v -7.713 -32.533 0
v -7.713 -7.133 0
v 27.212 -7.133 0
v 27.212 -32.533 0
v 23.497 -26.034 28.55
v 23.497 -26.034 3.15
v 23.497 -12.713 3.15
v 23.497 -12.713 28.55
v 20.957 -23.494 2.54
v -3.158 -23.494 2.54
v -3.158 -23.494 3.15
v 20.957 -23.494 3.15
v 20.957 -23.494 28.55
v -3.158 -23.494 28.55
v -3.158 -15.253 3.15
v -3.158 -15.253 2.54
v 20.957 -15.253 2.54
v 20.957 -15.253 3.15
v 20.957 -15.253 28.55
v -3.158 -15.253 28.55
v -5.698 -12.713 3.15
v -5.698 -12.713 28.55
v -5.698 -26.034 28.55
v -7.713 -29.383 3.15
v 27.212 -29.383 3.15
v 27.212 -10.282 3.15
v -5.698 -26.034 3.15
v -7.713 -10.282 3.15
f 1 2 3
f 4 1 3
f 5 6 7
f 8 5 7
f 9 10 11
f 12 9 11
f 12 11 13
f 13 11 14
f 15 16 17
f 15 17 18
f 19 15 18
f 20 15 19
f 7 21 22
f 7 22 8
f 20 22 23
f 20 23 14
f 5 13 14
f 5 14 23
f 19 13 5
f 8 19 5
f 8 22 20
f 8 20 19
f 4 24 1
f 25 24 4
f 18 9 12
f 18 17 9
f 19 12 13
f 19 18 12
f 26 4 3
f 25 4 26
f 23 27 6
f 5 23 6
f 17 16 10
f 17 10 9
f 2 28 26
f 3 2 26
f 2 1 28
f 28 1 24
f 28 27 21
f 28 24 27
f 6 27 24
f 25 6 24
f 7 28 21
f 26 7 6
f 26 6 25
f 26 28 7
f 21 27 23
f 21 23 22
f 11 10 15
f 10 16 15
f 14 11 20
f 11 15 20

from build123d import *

# Parameters (mm, degrees)
F0_W        = 34.925
F0_H        = 25.4
F1_DEPTH    = 3.1496
F2_SIZE     = 3.14959
F3_W        = 29.1948509403
F3_H        = 13.3209023625
F4_DEPTH    = 25.4
F5_T        = 2.54
F5_T3_DEPTH = 34.2748509403
F5_T5_DEPTH = 18.4009023625


# Not quite as in the source:
# - a fillet or chamfer is up to 0.001 mm smaller than in the source, because OpenCascade refuses the exact size
# - a shell that OpenCascade refuses in one call is made with other operations: the cavity is built on its own and cut out


with BuildPart() as f1:
    # F0 (on Top) → F1 (new body)
    with BuildSketch(Plane.XY):
        with Locations((9.7498925388, -19.8326882303)):
            Rectangle(F0_W, F0_H)
    extrude(amount=F1_DEPTH)

    # F2 (size 3.1496 in the source; OpenCascade refuses exactly that, so slightly less here)
    f2_edges = [f1.edges().sort_by_distance(p)[0] for p in [
        (9.749893, -32.532688, 3.1496),
        (9.749893, -7.132688, 3.1496),
    ]]
    chamfer(f2_edges, length=F2_SIZE)

    # F3 (on face) → F4 (join)
    with BuildSketch(Plane.XY.offset(3.1496)):
        with Locations((8.8992563542, -19.3738183007)):
            Rectangle(F3_W, F3_H)
    extrude(amount=F4_DEPTH)

    # F5: shell of thickness 2.54, made by hand


with BuildPart() as f5_core1:
    # F5_t2: copy of F1
    add(f1.part)

    # the walls: a layer under each face that stays
    f5_faces = [f5_core1.faces().sort_by_distance(p)[0] for p in [
        (27.2123925388, -19.8326882303, 1.5748),
        (9.7498925388, -32.5326882303, 5e-06),
        (9.7498925388, -30.9578932303, 1.574805),
        (9.7498925388, -19.8326882303, 0),
        (-1.8917741279, -26.1996282303, 3.1496),
        (9.7498925388, -7.1326882303, 5e-06),
        (9.7498925388, -8.7074832303, 1.574805),
        (-7.7126074612, -19.8326882303, 1.5748),
        (8.8992563542, -12.7133671194, 15.8496),
        (-5.6981691159, -19.3738183007, 15.8496),
        (8.8992563542, -26.0342694819, 15.8496),
        (23.4966818243, -19.3738183007, 15.8496),
    ]]
    thicken(f5_faces, amount=-F5_T, mode=Mode.SUBTRACT)

    # F5_s4 → F5_t3 (cut)
    with BuildSketch(Plane.YZ.offset(-8.2381691159)):
        Polygon((-12.6879671194, 3.175), (-12.7133671194, 0.6096), (-15.2533671194, 0.6096), (-15.2533671194, 3.1496), align=None)
        Polygon((-26.0596694819, 3.175), (-26.0342694819, 0.6096), (-23.4942694819, 0.6096), (-23.4942694819, 3.1496), align=None)
    extrude(amount=F5_T3_DEPTH, mode=Mode.SUBTRACT)

    # F5_s6 → F5_t5 (cut)
    with BuildSketch(Plane.XZ.offset(10.1733671194)):
        Polygon((-5.7235691159, 3.175), (-5.6981691159, 0.6096), (-3.1581691159, 0.6096), (-3.1581691159, 3.1496), align=None)
        Polygon((23.5220818243, 3.175), (23.4966818243, 0.6096), (20.9566818243, 0.6096), (20.9566818243, 3.1496), align=None)
    extrude(amount=F5_T5_DEPTH, mode=Mode.SUBTRACT)


with BuildPart() as f1_1:
    add(f1.part)

    # what is left inside the walls is the cavity
    f5_cavity = [f5_core1.part.solids().sort_by_distance(p)[0] for p in [
        (12.918398, -15.278767, 15.5448),
    ]]
    add(f5_cavity, mode=Mode.SUBTRACT)


solid = f1_1.part
